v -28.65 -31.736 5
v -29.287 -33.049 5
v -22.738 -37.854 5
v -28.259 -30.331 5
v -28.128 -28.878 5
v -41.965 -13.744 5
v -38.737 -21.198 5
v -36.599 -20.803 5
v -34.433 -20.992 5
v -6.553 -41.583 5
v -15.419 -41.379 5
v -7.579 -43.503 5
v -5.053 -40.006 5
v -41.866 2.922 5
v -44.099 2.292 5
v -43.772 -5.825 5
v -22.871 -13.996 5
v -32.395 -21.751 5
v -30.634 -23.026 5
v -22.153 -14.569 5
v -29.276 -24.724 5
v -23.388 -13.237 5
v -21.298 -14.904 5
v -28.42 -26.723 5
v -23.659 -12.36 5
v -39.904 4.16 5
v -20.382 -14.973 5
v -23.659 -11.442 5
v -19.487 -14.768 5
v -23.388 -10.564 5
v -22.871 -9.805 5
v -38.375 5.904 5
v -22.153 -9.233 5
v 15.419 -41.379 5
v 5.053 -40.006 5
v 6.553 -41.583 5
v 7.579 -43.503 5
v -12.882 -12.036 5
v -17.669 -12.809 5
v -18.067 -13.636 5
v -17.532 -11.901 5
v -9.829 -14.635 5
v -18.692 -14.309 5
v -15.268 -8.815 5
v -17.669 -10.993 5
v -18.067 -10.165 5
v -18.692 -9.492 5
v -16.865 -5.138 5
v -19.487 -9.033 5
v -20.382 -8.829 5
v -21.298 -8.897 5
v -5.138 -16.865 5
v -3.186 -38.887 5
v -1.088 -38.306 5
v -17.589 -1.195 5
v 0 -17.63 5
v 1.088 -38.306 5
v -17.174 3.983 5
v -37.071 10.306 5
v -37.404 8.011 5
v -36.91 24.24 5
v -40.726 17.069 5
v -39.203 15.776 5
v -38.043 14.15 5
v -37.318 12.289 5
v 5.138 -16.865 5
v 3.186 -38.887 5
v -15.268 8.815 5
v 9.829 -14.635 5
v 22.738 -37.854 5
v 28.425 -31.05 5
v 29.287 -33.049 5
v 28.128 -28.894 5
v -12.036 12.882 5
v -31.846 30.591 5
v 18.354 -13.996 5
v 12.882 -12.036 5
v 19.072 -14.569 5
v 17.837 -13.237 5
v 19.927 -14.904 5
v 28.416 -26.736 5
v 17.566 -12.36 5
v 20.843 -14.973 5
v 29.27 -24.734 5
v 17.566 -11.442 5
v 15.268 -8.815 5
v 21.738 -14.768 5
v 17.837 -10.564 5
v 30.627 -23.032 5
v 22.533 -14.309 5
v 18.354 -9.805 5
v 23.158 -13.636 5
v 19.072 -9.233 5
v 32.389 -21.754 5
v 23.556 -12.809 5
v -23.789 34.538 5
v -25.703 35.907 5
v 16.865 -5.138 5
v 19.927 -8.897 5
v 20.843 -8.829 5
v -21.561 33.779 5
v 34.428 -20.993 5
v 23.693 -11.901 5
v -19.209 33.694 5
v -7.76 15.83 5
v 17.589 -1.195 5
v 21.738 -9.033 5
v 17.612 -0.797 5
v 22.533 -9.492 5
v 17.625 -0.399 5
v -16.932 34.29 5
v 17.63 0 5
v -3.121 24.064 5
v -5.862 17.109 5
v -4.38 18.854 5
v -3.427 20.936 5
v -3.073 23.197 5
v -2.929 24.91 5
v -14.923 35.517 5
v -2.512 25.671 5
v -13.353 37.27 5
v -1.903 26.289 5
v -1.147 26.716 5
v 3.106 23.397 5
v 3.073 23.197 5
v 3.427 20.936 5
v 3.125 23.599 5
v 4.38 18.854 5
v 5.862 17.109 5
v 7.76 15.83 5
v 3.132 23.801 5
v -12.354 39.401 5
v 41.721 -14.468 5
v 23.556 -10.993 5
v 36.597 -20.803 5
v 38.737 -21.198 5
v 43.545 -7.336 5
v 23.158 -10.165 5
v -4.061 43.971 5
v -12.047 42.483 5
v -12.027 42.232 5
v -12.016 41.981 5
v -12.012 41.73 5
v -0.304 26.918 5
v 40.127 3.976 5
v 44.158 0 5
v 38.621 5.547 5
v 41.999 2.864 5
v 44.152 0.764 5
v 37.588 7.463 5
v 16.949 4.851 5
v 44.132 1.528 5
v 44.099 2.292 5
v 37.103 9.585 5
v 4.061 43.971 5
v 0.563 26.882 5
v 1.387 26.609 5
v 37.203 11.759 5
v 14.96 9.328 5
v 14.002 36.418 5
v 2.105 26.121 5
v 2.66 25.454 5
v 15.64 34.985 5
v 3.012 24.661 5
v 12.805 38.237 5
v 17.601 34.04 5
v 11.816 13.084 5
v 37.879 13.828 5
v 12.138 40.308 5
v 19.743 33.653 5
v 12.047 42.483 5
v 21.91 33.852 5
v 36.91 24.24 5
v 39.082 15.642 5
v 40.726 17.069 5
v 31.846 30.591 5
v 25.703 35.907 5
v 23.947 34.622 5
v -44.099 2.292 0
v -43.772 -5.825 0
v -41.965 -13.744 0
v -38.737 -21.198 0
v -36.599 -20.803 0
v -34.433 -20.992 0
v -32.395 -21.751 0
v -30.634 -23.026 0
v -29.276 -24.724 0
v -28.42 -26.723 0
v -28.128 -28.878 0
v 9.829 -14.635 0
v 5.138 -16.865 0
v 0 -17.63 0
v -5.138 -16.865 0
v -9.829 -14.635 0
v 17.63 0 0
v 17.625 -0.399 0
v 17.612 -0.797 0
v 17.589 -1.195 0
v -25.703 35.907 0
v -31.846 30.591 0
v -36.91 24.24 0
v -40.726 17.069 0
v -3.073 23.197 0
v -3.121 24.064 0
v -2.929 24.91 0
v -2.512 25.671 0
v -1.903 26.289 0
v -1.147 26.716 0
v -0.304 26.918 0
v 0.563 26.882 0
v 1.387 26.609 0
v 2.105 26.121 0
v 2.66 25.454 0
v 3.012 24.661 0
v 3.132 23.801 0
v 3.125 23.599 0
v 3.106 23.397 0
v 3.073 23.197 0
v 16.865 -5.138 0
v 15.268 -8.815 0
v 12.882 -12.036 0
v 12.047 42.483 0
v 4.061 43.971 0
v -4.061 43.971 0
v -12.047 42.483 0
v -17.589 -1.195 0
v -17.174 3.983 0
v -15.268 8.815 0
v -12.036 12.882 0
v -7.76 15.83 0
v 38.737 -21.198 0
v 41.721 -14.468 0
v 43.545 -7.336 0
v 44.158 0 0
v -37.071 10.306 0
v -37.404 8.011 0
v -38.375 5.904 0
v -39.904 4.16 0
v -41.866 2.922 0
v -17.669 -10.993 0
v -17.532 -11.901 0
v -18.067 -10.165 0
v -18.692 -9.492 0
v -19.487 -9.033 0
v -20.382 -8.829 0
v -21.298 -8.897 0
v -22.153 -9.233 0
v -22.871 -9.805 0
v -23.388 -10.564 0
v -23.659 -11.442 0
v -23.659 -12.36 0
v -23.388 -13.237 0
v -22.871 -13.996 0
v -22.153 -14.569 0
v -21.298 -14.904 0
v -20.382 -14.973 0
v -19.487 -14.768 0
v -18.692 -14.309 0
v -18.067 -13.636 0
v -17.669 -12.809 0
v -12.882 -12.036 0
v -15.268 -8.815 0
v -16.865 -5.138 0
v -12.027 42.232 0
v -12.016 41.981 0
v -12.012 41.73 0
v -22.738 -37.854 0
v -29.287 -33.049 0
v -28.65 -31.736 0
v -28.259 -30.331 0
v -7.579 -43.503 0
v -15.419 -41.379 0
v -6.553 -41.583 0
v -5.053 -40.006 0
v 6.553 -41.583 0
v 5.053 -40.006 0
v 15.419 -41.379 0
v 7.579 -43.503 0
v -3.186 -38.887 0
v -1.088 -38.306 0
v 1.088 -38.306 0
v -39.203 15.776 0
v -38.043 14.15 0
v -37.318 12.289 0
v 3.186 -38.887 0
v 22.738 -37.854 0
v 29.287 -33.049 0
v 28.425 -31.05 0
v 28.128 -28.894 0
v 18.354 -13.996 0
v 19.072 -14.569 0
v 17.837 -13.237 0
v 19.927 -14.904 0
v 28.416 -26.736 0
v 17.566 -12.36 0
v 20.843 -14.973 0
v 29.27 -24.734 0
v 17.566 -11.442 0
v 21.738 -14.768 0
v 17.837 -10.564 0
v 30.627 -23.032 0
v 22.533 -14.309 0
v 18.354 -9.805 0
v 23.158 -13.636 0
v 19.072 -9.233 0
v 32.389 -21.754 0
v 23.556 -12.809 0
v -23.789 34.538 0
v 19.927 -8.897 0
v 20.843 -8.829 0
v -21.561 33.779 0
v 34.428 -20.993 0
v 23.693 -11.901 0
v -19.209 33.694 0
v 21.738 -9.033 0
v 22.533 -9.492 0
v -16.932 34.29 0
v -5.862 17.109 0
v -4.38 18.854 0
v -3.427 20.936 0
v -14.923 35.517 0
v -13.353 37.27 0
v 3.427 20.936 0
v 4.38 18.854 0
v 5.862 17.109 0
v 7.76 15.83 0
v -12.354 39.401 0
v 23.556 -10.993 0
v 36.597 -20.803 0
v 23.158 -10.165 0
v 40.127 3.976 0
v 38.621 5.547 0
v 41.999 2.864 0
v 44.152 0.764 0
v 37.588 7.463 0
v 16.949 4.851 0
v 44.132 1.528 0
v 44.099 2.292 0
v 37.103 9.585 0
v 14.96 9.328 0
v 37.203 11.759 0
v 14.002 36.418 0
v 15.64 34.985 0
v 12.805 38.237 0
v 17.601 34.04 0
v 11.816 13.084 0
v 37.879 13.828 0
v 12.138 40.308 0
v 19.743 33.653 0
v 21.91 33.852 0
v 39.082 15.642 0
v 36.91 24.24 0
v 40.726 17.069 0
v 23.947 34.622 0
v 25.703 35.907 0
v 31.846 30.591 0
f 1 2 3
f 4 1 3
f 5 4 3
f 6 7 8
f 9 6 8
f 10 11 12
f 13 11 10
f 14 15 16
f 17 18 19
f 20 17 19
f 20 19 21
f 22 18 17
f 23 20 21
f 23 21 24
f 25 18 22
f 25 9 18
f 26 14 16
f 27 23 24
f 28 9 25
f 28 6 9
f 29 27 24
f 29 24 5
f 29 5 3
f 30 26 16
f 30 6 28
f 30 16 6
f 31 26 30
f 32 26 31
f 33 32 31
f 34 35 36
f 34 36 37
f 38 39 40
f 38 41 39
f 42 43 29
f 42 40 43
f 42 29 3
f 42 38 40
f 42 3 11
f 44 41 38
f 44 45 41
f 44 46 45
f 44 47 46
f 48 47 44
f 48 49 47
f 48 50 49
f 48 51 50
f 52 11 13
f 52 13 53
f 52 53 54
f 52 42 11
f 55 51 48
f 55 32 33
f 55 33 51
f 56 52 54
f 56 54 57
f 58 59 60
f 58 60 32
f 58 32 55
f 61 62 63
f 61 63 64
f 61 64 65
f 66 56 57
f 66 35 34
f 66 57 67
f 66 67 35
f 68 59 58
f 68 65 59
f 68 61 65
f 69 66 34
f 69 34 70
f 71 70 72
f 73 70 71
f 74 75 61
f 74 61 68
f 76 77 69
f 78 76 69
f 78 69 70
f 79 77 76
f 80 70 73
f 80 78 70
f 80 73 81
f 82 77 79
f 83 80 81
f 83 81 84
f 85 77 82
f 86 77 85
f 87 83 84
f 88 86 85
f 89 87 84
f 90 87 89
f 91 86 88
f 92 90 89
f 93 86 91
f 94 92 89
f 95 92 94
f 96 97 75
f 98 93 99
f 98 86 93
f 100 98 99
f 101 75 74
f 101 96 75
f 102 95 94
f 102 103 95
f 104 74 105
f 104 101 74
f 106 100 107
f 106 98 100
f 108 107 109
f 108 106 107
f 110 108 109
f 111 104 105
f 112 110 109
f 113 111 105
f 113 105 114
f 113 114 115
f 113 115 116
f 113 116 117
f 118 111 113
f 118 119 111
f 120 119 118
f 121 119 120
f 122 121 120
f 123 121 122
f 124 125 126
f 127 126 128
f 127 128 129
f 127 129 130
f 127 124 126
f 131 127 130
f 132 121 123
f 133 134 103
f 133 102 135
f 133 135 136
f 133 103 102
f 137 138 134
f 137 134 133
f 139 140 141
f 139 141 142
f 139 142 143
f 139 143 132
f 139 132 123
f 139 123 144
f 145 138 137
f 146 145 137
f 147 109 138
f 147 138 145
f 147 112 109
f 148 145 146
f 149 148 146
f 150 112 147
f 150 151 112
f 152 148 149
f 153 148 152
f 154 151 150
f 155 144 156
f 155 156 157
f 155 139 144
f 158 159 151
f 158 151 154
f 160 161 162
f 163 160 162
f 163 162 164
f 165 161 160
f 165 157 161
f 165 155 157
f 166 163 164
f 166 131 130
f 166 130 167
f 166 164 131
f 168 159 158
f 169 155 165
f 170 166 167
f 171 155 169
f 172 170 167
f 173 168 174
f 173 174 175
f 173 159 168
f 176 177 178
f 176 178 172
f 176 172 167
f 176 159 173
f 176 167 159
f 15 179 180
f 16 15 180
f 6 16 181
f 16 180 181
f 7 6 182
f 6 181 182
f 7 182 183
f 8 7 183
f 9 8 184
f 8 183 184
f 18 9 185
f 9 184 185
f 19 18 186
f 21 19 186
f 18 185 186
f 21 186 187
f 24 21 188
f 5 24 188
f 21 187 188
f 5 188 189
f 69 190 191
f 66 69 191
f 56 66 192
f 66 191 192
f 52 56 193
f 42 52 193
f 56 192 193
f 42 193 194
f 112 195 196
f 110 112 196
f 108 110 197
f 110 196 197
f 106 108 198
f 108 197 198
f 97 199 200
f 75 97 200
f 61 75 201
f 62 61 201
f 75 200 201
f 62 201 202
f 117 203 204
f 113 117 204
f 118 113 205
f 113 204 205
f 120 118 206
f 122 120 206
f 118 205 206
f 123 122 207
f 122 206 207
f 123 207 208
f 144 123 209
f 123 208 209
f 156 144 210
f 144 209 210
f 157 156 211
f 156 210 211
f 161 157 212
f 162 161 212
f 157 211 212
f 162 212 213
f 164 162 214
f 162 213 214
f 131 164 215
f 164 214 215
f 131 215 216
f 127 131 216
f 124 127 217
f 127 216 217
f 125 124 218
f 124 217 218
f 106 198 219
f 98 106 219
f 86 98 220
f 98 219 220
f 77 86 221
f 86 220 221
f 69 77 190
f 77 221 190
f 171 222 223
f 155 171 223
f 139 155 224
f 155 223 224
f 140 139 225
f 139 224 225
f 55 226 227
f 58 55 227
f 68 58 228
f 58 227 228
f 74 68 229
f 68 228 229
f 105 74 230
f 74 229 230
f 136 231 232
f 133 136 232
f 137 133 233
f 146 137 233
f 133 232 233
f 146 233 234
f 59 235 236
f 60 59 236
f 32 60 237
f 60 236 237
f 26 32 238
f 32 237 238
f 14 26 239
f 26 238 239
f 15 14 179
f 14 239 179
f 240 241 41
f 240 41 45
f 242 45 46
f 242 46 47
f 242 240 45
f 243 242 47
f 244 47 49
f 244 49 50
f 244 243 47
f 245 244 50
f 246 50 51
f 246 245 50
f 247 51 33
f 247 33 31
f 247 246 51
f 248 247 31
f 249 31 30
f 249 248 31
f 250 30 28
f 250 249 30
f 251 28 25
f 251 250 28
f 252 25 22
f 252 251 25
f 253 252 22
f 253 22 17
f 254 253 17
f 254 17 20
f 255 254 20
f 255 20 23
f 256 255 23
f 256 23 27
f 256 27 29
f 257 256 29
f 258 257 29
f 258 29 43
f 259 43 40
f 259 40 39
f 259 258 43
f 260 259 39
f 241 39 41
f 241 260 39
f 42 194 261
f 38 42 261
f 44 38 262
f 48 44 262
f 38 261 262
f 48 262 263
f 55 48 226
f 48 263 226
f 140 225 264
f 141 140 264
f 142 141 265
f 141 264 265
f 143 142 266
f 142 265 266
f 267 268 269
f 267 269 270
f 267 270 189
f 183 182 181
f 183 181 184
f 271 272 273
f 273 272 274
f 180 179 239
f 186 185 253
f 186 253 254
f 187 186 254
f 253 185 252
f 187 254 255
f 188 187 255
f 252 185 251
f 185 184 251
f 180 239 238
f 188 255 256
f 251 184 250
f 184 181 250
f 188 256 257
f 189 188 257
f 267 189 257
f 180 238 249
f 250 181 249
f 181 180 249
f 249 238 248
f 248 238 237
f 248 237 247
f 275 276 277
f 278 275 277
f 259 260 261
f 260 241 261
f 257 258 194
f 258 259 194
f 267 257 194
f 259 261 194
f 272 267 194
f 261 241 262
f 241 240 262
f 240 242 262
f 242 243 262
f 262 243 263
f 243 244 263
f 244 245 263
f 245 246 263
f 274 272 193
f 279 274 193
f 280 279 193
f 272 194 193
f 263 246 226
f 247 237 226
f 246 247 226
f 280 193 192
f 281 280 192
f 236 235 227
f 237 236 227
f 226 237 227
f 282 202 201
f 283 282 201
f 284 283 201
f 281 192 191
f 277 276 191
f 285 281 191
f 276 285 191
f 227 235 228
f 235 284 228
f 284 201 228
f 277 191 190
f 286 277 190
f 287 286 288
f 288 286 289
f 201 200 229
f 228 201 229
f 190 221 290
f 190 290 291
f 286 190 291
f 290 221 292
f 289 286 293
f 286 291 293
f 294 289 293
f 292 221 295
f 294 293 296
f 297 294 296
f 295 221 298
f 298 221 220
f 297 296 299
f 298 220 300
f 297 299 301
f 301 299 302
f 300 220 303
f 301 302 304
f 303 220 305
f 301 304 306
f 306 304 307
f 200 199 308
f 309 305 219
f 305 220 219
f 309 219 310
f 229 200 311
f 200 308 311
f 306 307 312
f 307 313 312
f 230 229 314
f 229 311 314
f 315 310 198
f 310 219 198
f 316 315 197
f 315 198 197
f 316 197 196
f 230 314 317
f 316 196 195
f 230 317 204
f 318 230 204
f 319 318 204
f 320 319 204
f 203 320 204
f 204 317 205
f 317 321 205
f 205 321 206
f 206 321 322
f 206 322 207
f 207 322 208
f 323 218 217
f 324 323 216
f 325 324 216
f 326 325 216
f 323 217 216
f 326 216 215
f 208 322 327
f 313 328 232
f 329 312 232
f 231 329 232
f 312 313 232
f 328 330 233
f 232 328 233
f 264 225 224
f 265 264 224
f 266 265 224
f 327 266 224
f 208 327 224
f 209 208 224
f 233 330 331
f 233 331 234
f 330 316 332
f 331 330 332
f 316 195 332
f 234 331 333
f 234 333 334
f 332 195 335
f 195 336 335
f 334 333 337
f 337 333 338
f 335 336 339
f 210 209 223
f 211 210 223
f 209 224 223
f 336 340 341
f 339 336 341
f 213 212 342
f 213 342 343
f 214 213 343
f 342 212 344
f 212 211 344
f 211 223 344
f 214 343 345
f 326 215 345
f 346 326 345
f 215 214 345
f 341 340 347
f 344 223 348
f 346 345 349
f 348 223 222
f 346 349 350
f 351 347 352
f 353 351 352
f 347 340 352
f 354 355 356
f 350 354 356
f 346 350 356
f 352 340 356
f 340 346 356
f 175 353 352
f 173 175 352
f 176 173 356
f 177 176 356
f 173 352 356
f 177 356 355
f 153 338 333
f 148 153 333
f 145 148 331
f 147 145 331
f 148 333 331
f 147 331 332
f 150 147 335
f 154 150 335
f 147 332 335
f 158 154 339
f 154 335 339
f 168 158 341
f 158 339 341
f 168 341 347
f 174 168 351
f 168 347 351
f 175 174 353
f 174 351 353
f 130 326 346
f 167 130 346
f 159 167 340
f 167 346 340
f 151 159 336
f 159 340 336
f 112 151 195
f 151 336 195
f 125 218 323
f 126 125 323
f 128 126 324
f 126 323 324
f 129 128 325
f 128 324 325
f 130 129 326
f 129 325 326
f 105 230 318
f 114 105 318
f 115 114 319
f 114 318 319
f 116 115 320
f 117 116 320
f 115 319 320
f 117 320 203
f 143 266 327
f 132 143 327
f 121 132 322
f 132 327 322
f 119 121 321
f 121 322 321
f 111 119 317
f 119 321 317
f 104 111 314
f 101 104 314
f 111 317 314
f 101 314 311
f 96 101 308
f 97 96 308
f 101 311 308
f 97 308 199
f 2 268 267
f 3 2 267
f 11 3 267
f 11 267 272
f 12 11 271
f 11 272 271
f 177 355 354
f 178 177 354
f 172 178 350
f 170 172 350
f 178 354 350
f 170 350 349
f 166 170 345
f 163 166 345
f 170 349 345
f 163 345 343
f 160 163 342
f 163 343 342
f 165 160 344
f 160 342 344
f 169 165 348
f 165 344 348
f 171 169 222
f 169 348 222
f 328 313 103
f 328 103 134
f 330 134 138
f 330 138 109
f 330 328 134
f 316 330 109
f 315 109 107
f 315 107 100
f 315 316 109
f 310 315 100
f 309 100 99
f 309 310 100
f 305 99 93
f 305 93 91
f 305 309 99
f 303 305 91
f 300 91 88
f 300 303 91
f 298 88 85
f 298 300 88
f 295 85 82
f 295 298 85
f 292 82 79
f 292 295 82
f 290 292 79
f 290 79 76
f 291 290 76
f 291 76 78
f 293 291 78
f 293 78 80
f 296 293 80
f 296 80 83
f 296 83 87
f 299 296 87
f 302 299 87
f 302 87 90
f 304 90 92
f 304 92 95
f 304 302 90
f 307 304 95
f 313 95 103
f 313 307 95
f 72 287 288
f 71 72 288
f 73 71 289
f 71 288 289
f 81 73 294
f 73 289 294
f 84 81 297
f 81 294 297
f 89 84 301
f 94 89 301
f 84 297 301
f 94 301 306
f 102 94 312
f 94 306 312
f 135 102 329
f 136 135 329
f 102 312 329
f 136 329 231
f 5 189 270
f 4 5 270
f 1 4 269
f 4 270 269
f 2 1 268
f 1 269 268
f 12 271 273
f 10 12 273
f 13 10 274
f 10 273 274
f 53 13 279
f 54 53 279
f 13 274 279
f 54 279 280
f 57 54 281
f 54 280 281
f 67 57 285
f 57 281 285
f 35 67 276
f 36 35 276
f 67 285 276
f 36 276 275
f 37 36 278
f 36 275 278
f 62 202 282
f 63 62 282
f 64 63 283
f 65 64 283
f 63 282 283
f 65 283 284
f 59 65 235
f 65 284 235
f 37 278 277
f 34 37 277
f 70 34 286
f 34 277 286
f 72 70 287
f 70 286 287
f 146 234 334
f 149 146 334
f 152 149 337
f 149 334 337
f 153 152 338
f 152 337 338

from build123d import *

# Parameters (mm, degrees)
F0_R     = 3.0805460827
F1_DEPTH = 5


with BuildPart() as f1:
    # F0 (on Top) → F1 (new body)
    with BuildSketch(Plane.XY):
        with BuildLine():
            ThreePointArc((38.7372693115, -21.1983433866), (31.1931013311, -7.1196218248), (44.0986901689, 2.2915761904))
            ThreePointArc((44.0986901689, 2.2915761904), (37.273760147, 8.5074925195), (40.7258246034, 17.0690657747))
            ThreePointArc((40.7258246034, 17.0690657747), (25.0149250542, 19.9487370556), (25.7034571856, 35.9065186946))
            ThreePointArc((25.7034571856, 35.9065186946), (16.5883838399, 34.4461339782), (12.0470033135, 42.4831202622))
            ThreePointArc((12.0470033135, 42.4831202622), (0, 31.9952900531), (-12.0470033135, 42.4831202622))
            ThreePointArc((-12.0470033135, 42.4831202622), (-12.0206191757, 42.1068190332), (-12.0118180753, 41.729696668))
            ThreePointArc((-12.0118180753, 41.729696668), (-16.9319780047, 34.2904362337), (-25.7034571856, 35.9065186946))
            ThreePointArc((-25.7034571856, 35.9065186946), (-23.2277433364, 32.0404826351), (-22.3613630755, 27.5321815005))
            ThreePointArc((-22.3613630755, 27.5321815005), (-28.503168199, 16.9641845533), (-40.7258246034, 17.0690657747))
            ThreePointArc((-40.7258246034, 17.0690657747), (-38.0432125415, 14.1499197283), (-37.0710737614, 10.3063839463))
            ThreePointArc((-37.0710737614, 10.3063839463), (-39.0767925501, 4.9766434335), (-44.0986901689, 2.2915761904))
            ThreePointArc((-44.0986901689, 2.2915761904), (-34.8293180265, -0.8629063864), (-30.8881520208, -9.8261218116))
            ThreePointArc((-30.8881520208, -9.8261218116), (-33.040951009, -16.7351026662), (-38.7372693115, -21.1983433866))
            ThreePointArc((-38.7372693115, -21.1983433866), (-31.471625408, -22.3291562996), (-28.1275289546, -28.8778460989))
            ThreePointArc((-28.1275289546, -28.8778460989), (-28.4227133995, -31.0424462167), (-29.2867100058, -33.0489699248))
            ThreePointArc((-29.2867100058, -33.0489699248), (-15.640987417, -28.142300009), (-6.9966203098, -39.7851549832))
            ThreePointArc((-6.9966203098, -39.7851549832), (-7.14303654, -41.6667113538), (-7.5787601318, -43.5029676105))
            ThreePointArc((-7.5787601318, -43.5029676105), (0, -38.2323243404), (7.5787601318, -43.5029676105))
            ThreePointArc((7.5787601318, -43.5029676105), (13.8822360824, -28.8267602574), (29.2867100058, -33.0489699248))
            ThreePointArc((29.2867100058, -33.0489699248), (29.8912348172, -23.8374643276), (38.7372693115, -21.1983433866))
        make_face()
        with Locations((-20.6125697417, -11.9006726891)):
            Circle(F0_R, mode=Mode.SUBTRACT)
        with Locations((20.6125697417, -11.9006726891)):
            Circle(F0_R, mode=Mode.SUBTRACT)
        with BuildLine():
            ThreePointArc((7.7599617955, 15.8301915799), (14.9602642781, 9.3275112035), (17.6298602525, 0))
            ThreePointArc((17.6298602525, 0), (17.619724514, -0.5977295172), (17.5893289527, -1.1947717426))
            ThreePointArc((17.5893289527, -1.1947717426), (15.2679068439, -8.8149301263), (9.8293671572, -14.6354198373))
            ThreePointArc((9.8293671572, -14.6354198373), (0, -17.6298602525), (-9.8293671572, -14.6354198373))
            ThreePointArc((-9.8293671572, -14.6354198373), (-15.2679068439, -8.8149301263), (-17.5893289527, -1.1947717426))
            ThreePointArc((-17.5893289527, -1.1947717426), (-15.2679068439, 8.8149301263), (-7.7599617955, 15.8301915799))
            ThreePointArc((-7.7599617955, 15.8301915799), (-4.3804103986, 18.8544554654), (-3.0730313634, 23.1970698569))
            ThreePointArc((-3.0730313634, 23.1970698569), (-0.303567141, 26.9184783007), (3.1318797336, 23.8013453782))
            ThreePointArc((3.1318797336, 23.8013453782), (3.1171329225, 23.4977782372), (3.0730313634, 23.1970698569))
            ThreePointArc((3.0730313634, 23.1970698569), (4.3804103986, 18.8544554654), (7.7599617955, 15.8301915799))
        make_face(mode=Mode.SUBTRACT)
        with BuildLine():
            ThreePointArc((-22.3613630755, 27.5321815005), (-23.2277433364, 32.0404826351), (-25.7034571856, 35.9065186946))
            ThreePointArc((-25.7034571856, 35.9065186946), (-34.5242636109, 27.5321815005), (-40.7258246034, 17.0690657747))
            ThreePointArc((-40.7258246034, 17.0690657747), (-28.503168199, 16.9641845533), (-22.3613630755, 27.5321815005))
        make_face()
        with BuildLine():
            ThreePointArc((-44.0986901689, 2.2915761904), (-43.0510525562, -9.8261218116), (-38.7372693115, -21.1983433866))
            ThreePointArc((-38.7372693115, -21.1983433866), (-33.040951009, -16.7351026662), (-30.8881520208, -9.8261218116))
            ThreePointArc((-30.8881520208, -9.8261218116), (-34.8293180265, -0.8629063864), (-44.0986901689, 2.2915761904))
        make_face()
        with BuildLine():
            ThreePointArc((-29.2867100058, -33.0489699248), (-19.1595208452, -39.7851549832), (-7.5787601318, -43.5029676105))
            ThreePointArc((-7.5787601318, -43.5029676105), (-7.14303654, -41.6667113538), (-6.9966203098, -39.7851549832))
            ThreePointArc((-6.9966203098, -39.7851549832), (-15.640987417, -28.142300009), (-29.2867100058, -33.0489699248))
        make_face()
        with BuildLine():
            ThreePointArc((7.5787601318, -43.5029676105), (19.1595208452, -39.7851549832), (29.2867100058, -33.0489699248))
            ThreePointArc((29.2867100058, -33.0489699248), (13.8822360824, -28.8267602574), (7.5787601318, -43.5029676105))
        make_face()
        with BuildLine():
            ThreePointArc((38.7372693115, -21.1983433866), (42.781500191, -10.9402485099), (44.1581905885, 0))
            ThreePointArc((44.1581905885, 0), (44.1433129774, 1.1461742599), (44.0986901689, 2.2915761904))
            ThreePointArc((44.0986901689, 2.2915761904), (31.1931013311, -7.1196218248), (38.7372693115, -21.1983433866))
        make_face()
        with BuildLine():
            ThreePointArc((25.7034571856, 35.9065186946), (25.0149250542, 19.9487370556), (40.7258246034, 17.0690657747))
            ThreePointArc((40.7258246034, 17.0690657747), (34.5242636109, 27.5321815005), (25.7034571856, 35.9065186946))
        make_face()
        with BuildLine():
            ThreePointArc((-12.0470033135, 42.4831202622), (0, 31.9952900531), (12.0470033135, 42.4831202622))
            ThreePointArc((12.0470033135, 42.4831202622), (0, 44.1581905885), (-12.0470033135, 42.4831202622))
        make_face()
    extrude(amount=F1_DEPTH)


solid = f1.part
